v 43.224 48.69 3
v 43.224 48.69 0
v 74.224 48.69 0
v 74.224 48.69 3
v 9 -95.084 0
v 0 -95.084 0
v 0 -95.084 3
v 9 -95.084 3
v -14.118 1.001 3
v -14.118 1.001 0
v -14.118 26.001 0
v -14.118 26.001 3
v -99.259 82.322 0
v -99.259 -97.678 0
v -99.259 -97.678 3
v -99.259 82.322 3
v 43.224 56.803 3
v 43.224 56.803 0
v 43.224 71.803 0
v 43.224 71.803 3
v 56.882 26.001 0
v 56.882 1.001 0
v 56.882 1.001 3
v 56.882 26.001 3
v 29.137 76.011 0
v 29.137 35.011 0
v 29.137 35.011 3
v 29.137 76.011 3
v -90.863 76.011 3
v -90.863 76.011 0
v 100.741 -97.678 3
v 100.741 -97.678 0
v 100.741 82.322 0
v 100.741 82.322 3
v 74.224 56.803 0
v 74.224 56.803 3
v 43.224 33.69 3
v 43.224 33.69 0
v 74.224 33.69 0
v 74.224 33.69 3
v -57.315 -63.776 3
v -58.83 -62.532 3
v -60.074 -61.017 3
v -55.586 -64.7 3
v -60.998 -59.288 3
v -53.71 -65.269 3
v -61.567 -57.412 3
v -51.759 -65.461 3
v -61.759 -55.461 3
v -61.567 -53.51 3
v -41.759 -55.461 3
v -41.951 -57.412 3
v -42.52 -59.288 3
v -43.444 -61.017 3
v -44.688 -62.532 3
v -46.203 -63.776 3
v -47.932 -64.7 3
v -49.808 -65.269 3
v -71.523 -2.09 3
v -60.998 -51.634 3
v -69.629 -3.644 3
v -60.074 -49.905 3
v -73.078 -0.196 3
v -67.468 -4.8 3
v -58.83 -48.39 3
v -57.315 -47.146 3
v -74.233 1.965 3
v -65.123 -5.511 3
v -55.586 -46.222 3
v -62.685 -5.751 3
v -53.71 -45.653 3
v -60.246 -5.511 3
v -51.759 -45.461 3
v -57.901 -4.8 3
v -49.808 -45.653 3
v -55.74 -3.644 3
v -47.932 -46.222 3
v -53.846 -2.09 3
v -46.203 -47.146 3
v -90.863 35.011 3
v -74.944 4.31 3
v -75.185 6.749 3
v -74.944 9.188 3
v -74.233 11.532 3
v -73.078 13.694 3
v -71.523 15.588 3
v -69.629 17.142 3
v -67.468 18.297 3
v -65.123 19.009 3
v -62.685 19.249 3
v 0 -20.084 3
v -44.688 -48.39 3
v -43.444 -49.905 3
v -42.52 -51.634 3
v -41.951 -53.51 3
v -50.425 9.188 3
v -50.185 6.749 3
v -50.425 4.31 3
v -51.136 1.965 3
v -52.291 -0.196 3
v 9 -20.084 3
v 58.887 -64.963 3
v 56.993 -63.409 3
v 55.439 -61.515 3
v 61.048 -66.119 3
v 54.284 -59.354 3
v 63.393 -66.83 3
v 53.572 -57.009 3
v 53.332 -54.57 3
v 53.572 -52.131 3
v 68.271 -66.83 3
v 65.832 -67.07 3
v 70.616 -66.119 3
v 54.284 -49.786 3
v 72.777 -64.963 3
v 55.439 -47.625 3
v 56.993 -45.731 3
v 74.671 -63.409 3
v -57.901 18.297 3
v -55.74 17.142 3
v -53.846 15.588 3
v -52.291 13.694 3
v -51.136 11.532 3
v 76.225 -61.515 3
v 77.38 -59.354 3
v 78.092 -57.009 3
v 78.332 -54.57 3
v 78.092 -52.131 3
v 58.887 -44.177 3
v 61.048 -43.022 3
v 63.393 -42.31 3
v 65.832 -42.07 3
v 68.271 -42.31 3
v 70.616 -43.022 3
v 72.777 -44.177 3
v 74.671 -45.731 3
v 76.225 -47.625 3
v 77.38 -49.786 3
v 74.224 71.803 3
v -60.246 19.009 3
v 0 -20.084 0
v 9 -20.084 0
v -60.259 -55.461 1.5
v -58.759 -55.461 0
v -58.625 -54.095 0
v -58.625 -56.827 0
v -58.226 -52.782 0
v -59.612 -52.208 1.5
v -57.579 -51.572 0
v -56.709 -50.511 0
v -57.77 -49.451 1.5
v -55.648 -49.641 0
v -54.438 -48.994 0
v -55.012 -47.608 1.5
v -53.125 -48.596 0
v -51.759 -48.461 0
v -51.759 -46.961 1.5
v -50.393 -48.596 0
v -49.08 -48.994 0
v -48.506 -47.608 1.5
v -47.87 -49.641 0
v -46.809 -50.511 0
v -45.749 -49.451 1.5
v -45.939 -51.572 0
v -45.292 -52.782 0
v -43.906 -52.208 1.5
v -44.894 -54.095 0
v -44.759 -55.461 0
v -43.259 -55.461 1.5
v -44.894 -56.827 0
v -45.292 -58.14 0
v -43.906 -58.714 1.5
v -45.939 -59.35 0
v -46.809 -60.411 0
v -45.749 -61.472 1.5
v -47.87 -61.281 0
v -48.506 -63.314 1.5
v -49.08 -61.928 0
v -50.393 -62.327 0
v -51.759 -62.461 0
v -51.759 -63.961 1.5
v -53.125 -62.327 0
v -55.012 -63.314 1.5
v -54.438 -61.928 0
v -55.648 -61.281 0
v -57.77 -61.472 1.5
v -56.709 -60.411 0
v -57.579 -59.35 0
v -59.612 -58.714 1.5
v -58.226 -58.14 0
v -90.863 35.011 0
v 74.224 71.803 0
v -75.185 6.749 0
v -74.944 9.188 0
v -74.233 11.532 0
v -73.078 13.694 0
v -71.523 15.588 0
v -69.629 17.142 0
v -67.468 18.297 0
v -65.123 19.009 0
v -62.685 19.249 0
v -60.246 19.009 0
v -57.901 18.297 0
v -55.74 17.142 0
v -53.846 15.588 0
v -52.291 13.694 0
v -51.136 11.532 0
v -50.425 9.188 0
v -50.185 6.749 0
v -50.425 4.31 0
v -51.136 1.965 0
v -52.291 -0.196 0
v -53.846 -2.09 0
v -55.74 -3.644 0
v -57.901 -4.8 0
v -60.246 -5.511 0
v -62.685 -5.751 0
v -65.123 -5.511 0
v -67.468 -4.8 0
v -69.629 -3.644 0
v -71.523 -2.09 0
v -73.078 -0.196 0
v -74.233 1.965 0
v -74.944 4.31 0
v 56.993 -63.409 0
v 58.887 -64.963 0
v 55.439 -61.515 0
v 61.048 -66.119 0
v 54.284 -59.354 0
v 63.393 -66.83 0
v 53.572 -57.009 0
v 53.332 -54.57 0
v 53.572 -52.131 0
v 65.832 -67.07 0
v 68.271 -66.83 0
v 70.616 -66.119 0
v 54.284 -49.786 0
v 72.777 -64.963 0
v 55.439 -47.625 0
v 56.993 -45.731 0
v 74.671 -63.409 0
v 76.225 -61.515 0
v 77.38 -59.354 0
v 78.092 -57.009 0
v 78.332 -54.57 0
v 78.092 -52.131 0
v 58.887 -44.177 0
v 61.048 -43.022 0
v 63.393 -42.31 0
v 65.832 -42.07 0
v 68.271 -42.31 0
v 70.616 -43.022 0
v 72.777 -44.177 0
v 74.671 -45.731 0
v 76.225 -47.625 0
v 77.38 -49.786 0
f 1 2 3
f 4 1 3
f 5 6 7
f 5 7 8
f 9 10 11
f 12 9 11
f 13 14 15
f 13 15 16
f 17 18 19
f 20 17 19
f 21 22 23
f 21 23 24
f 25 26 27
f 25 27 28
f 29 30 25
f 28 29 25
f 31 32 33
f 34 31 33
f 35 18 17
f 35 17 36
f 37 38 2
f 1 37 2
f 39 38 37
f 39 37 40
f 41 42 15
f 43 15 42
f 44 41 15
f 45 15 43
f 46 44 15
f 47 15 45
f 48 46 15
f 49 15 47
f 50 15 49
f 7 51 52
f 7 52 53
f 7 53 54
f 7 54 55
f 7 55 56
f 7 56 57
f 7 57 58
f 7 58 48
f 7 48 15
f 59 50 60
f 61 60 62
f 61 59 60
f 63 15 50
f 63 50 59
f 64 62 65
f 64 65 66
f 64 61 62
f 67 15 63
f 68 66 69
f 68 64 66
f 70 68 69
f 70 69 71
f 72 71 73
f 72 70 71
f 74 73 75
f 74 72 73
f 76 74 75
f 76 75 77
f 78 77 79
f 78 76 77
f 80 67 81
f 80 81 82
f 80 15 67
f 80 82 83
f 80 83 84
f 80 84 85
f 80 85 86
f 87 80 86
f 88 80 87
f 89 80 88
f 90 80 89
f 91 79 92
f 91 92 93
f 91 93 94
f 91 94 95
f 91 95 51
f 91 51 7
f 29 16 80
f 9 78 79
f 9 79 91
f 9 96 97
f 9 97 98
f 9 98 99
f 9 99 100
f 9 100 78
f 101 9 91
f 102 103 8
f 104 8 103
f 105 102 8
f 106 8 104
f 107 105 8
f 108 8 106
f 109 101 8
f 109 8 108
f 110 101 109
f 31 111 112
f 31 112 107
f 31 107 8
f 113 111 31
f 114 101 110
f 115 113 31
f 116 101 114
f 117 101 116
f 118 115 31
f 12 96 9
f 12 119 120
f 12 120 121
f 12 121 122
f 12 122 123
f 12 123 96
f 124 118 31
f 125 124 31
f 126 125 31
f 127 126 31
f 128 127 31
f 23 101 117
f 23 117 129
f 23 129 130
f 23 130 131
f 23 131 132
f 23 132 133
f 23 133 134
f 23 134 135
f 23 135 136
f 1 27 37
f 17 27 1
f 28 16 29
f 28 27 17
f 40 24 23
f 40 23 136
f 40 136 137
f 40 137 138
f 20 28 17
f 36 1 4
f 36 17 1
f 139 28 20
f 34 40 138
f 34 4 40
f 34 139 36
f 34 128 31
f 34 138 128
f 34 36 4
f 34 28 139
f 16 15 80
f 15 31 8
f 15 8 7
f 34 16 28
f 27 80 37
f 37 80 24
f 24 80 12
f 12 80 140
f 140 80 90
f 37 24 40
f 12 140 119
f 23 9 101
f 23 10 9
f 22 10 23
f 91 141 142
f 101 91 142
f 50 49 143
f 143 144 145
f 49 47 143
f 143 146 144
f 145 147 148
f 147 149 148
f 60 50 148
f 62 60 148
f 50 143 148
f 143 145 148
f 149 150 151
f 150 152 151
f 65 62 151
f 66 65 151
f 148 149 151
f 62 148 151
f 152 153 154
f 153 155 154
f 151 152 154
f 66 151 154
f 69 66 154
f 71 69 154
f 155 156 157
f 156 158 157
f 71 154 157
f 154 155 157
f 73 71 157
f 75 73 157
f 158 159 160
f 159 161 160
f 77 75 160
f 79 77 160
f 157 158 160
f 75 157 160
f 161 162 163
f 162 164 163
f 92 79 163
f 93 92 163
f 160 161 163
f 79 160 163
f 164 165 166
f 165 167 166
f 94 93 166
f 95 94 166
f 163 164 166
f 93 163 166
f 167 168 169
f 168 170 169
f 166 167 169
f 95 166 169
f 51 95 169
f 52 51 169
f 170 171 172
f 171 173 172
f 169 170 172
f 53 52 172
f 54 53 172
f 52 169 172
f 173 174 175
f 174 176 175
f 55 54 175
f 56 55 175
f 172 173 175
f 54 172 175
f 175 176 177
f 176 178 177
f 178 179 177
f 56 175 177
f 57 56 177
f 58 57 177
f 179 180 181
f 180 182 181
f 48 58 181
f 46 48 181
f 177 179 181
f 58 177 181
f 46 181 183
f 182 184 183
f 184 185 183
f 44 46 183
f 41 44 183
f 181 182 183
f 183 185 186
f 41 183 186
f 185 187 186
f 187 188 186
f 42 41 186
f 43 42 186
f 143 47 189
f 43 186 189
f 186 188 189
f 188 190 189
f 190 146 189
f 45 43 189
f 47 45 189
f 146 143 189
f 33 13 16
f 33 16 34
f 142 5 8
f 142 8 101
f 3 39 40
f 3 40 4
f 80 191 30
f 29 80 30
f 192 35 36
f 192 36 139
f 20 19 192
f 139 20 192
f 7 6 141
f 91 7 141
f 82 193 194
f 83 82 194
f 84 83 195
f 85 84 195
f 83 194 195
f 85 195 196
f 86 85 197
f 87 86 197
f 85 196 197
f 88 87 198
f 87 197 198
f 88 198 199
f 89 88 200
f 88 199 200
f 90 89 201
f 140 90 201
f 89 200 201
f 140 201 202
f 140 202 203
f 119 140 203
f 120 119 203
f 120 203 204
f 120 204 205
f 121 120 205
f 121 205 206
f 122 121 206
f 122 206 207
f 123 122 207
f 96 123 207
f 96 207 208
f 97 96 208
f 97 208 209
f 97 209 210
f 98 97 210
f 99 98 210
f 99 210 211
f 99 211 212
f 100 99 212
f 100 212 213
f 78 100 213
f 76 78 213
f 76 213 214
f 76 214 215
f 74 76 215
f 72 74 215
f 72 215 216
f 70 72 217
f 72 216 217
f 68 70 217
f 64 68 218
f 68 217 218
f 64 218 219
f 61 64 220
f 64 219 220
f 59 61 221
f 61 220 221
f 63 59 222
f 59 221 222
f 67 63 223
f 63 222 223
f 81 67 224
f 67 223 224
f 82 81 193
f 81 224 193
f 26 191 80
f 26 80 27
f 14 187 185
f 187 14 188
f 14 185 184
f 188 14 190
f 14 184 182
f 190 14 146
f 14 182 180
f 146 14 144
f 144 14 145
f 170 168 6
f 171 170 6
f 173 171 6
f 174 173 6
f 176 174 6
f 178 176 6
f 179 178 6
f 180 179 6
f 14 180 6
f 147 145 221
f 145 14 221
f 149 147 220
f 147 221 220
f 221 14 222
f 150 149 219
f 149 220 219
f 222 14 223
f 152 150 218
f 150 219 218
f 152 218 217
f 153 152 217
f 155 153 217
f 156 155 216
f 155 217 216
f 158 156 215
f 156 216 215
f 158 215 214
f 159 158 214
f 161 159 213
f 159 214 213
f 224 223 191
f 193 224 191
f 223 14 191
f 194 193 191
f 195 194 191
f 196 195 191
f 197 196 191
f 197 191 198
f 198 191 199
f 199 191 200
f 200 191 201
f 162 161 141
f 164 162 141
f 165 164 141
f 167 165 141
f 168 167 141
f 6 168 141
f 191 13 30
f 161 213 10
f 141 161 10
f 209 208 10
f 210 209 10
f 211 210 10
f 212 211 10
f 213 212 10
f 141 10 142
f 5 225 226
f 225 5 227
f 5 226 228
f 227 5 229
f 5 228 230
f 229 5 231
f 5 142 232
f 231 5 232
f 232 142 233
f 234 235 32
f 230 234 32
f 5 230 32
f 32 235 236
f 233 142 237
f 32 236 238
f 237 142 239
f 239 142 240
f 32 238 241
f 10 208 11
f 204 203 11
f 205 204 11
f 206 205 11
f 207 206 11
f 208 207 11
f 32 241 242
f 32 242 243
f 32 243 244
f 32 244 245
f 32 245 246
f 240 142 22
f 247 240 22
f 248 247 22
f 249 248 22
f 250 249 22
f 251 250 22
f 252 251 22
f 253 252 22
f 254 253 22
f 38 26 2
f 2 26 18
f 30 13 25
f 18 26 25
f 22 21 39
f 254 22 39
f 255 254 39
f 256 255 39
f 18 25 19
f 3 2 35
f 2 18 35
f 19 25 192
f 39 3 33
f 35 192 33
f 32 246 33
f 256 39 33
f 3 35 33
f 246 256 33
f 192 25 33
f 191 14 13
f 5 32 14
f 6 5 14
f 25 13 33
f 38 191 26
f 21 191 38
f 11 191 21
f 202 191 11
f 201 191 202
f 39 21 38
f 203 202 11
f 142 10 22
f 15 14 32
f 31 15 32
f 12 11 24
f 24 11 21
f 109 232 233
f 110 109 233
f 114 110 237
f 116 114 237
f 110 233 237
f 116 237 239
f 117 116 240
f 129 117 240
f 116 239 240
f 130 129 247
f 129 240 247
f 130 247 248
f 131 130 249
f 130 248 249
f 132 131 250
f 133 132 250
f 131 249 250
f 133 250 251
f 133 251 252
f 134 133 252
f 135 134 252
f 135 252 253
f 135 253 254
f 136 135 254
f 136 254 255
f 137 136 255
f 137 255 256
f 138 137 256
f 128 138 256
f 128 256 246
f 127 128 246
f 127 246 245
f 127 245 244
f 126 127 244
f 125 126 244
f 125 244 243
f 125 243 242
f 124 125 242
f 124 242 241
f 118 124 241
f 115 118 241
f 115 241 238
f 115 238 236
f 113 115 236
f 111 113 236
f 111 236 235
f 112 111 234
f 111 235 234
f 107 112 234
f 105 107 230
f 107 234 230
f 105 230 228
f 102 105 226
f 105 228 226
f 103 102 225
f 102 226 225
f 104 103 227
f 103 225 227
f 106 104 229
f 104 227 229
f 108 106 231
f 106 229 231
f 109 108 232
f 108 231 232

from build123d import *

# Parameters (mm, degrees)
F0_W           = 200
F0_H           = 180
F0_W_2         = 9
F0_H_2         = 75
F0_W_3         = 120
F0_H_3         = 41
F0_W_4         = 71
F0_H_4         = 25
F0_W_5         = 31
F0_H_5         = 15
F1_DEPTH       = 3
F4_D           = 8.8
F4_CSINK_D     = 20
F4_CSINK_ANGLE = 90
F5_D           = 25
F6_D           = 25


# Not quite as in the source:
# - a feature of the source that left no trace in its solid (it failed there, or was rolled back) is left out
# - the program builds the solid bodies; features that only make, move or delete a surface that nothing else refers to are left out


with BuildPart() as f1:
    # F0 (on Top) → F1 (new body)
    with BuildSketch(Plane.XY):
        with Locations((0.7408946753, -7.6781137288)):
            Rectangle(F0_W, F0_H)
        with Locations((4.5, -57.5837731361)):
            Rectangle(F0_W_2, F0_H_2, mode=Mode.SUBTRACT)
        with Locations((-30.8628822118, 55.5105576217)):
            Rectangle(F0_W_3, F0_H_3, mode=Mode.SUBTRACT)
        with Locations((21.3823994361, 13.5011318373)):
            Rectangle(F0_W_4, F0_H_4, mode=Mode.SUBTRACT)
        with Locations((58.7239102691, 41.1898118258)):
            Rectangle(F0_W_5, F0_H_5, mode=Mode.SUBTRACT)
        with Locations((58.7239102691, 64.3030141294)):
            Rectangle(F0_W_5, F0_H_5, mode=Mode.SUBTRACT)
    extrude(amount=F1_DEPTH)

    # F4 (through all)
    with Locations(Plane.XY.offset(3)):
        with Locations((-51.7591053247, -55.4611310363)):
            CounterSinkHole(F4_D / 2, F4_CSINK_D / 2, counter_sink_angle=F4_CSINK_ANGLE)

    # F5 (through all)
    with Locations(Plane.XY.offset(3)):
        with Locations((65.8319948756, -54.5700079396)):
            Hole(F5_D / 2)

    # F6 (through all)
    with Locations(Plane.XY.offset(3)):
        with Locations((-62.68462408, 6.748889561)):
            Hole(F6_D / 2)


solid = f1.part
